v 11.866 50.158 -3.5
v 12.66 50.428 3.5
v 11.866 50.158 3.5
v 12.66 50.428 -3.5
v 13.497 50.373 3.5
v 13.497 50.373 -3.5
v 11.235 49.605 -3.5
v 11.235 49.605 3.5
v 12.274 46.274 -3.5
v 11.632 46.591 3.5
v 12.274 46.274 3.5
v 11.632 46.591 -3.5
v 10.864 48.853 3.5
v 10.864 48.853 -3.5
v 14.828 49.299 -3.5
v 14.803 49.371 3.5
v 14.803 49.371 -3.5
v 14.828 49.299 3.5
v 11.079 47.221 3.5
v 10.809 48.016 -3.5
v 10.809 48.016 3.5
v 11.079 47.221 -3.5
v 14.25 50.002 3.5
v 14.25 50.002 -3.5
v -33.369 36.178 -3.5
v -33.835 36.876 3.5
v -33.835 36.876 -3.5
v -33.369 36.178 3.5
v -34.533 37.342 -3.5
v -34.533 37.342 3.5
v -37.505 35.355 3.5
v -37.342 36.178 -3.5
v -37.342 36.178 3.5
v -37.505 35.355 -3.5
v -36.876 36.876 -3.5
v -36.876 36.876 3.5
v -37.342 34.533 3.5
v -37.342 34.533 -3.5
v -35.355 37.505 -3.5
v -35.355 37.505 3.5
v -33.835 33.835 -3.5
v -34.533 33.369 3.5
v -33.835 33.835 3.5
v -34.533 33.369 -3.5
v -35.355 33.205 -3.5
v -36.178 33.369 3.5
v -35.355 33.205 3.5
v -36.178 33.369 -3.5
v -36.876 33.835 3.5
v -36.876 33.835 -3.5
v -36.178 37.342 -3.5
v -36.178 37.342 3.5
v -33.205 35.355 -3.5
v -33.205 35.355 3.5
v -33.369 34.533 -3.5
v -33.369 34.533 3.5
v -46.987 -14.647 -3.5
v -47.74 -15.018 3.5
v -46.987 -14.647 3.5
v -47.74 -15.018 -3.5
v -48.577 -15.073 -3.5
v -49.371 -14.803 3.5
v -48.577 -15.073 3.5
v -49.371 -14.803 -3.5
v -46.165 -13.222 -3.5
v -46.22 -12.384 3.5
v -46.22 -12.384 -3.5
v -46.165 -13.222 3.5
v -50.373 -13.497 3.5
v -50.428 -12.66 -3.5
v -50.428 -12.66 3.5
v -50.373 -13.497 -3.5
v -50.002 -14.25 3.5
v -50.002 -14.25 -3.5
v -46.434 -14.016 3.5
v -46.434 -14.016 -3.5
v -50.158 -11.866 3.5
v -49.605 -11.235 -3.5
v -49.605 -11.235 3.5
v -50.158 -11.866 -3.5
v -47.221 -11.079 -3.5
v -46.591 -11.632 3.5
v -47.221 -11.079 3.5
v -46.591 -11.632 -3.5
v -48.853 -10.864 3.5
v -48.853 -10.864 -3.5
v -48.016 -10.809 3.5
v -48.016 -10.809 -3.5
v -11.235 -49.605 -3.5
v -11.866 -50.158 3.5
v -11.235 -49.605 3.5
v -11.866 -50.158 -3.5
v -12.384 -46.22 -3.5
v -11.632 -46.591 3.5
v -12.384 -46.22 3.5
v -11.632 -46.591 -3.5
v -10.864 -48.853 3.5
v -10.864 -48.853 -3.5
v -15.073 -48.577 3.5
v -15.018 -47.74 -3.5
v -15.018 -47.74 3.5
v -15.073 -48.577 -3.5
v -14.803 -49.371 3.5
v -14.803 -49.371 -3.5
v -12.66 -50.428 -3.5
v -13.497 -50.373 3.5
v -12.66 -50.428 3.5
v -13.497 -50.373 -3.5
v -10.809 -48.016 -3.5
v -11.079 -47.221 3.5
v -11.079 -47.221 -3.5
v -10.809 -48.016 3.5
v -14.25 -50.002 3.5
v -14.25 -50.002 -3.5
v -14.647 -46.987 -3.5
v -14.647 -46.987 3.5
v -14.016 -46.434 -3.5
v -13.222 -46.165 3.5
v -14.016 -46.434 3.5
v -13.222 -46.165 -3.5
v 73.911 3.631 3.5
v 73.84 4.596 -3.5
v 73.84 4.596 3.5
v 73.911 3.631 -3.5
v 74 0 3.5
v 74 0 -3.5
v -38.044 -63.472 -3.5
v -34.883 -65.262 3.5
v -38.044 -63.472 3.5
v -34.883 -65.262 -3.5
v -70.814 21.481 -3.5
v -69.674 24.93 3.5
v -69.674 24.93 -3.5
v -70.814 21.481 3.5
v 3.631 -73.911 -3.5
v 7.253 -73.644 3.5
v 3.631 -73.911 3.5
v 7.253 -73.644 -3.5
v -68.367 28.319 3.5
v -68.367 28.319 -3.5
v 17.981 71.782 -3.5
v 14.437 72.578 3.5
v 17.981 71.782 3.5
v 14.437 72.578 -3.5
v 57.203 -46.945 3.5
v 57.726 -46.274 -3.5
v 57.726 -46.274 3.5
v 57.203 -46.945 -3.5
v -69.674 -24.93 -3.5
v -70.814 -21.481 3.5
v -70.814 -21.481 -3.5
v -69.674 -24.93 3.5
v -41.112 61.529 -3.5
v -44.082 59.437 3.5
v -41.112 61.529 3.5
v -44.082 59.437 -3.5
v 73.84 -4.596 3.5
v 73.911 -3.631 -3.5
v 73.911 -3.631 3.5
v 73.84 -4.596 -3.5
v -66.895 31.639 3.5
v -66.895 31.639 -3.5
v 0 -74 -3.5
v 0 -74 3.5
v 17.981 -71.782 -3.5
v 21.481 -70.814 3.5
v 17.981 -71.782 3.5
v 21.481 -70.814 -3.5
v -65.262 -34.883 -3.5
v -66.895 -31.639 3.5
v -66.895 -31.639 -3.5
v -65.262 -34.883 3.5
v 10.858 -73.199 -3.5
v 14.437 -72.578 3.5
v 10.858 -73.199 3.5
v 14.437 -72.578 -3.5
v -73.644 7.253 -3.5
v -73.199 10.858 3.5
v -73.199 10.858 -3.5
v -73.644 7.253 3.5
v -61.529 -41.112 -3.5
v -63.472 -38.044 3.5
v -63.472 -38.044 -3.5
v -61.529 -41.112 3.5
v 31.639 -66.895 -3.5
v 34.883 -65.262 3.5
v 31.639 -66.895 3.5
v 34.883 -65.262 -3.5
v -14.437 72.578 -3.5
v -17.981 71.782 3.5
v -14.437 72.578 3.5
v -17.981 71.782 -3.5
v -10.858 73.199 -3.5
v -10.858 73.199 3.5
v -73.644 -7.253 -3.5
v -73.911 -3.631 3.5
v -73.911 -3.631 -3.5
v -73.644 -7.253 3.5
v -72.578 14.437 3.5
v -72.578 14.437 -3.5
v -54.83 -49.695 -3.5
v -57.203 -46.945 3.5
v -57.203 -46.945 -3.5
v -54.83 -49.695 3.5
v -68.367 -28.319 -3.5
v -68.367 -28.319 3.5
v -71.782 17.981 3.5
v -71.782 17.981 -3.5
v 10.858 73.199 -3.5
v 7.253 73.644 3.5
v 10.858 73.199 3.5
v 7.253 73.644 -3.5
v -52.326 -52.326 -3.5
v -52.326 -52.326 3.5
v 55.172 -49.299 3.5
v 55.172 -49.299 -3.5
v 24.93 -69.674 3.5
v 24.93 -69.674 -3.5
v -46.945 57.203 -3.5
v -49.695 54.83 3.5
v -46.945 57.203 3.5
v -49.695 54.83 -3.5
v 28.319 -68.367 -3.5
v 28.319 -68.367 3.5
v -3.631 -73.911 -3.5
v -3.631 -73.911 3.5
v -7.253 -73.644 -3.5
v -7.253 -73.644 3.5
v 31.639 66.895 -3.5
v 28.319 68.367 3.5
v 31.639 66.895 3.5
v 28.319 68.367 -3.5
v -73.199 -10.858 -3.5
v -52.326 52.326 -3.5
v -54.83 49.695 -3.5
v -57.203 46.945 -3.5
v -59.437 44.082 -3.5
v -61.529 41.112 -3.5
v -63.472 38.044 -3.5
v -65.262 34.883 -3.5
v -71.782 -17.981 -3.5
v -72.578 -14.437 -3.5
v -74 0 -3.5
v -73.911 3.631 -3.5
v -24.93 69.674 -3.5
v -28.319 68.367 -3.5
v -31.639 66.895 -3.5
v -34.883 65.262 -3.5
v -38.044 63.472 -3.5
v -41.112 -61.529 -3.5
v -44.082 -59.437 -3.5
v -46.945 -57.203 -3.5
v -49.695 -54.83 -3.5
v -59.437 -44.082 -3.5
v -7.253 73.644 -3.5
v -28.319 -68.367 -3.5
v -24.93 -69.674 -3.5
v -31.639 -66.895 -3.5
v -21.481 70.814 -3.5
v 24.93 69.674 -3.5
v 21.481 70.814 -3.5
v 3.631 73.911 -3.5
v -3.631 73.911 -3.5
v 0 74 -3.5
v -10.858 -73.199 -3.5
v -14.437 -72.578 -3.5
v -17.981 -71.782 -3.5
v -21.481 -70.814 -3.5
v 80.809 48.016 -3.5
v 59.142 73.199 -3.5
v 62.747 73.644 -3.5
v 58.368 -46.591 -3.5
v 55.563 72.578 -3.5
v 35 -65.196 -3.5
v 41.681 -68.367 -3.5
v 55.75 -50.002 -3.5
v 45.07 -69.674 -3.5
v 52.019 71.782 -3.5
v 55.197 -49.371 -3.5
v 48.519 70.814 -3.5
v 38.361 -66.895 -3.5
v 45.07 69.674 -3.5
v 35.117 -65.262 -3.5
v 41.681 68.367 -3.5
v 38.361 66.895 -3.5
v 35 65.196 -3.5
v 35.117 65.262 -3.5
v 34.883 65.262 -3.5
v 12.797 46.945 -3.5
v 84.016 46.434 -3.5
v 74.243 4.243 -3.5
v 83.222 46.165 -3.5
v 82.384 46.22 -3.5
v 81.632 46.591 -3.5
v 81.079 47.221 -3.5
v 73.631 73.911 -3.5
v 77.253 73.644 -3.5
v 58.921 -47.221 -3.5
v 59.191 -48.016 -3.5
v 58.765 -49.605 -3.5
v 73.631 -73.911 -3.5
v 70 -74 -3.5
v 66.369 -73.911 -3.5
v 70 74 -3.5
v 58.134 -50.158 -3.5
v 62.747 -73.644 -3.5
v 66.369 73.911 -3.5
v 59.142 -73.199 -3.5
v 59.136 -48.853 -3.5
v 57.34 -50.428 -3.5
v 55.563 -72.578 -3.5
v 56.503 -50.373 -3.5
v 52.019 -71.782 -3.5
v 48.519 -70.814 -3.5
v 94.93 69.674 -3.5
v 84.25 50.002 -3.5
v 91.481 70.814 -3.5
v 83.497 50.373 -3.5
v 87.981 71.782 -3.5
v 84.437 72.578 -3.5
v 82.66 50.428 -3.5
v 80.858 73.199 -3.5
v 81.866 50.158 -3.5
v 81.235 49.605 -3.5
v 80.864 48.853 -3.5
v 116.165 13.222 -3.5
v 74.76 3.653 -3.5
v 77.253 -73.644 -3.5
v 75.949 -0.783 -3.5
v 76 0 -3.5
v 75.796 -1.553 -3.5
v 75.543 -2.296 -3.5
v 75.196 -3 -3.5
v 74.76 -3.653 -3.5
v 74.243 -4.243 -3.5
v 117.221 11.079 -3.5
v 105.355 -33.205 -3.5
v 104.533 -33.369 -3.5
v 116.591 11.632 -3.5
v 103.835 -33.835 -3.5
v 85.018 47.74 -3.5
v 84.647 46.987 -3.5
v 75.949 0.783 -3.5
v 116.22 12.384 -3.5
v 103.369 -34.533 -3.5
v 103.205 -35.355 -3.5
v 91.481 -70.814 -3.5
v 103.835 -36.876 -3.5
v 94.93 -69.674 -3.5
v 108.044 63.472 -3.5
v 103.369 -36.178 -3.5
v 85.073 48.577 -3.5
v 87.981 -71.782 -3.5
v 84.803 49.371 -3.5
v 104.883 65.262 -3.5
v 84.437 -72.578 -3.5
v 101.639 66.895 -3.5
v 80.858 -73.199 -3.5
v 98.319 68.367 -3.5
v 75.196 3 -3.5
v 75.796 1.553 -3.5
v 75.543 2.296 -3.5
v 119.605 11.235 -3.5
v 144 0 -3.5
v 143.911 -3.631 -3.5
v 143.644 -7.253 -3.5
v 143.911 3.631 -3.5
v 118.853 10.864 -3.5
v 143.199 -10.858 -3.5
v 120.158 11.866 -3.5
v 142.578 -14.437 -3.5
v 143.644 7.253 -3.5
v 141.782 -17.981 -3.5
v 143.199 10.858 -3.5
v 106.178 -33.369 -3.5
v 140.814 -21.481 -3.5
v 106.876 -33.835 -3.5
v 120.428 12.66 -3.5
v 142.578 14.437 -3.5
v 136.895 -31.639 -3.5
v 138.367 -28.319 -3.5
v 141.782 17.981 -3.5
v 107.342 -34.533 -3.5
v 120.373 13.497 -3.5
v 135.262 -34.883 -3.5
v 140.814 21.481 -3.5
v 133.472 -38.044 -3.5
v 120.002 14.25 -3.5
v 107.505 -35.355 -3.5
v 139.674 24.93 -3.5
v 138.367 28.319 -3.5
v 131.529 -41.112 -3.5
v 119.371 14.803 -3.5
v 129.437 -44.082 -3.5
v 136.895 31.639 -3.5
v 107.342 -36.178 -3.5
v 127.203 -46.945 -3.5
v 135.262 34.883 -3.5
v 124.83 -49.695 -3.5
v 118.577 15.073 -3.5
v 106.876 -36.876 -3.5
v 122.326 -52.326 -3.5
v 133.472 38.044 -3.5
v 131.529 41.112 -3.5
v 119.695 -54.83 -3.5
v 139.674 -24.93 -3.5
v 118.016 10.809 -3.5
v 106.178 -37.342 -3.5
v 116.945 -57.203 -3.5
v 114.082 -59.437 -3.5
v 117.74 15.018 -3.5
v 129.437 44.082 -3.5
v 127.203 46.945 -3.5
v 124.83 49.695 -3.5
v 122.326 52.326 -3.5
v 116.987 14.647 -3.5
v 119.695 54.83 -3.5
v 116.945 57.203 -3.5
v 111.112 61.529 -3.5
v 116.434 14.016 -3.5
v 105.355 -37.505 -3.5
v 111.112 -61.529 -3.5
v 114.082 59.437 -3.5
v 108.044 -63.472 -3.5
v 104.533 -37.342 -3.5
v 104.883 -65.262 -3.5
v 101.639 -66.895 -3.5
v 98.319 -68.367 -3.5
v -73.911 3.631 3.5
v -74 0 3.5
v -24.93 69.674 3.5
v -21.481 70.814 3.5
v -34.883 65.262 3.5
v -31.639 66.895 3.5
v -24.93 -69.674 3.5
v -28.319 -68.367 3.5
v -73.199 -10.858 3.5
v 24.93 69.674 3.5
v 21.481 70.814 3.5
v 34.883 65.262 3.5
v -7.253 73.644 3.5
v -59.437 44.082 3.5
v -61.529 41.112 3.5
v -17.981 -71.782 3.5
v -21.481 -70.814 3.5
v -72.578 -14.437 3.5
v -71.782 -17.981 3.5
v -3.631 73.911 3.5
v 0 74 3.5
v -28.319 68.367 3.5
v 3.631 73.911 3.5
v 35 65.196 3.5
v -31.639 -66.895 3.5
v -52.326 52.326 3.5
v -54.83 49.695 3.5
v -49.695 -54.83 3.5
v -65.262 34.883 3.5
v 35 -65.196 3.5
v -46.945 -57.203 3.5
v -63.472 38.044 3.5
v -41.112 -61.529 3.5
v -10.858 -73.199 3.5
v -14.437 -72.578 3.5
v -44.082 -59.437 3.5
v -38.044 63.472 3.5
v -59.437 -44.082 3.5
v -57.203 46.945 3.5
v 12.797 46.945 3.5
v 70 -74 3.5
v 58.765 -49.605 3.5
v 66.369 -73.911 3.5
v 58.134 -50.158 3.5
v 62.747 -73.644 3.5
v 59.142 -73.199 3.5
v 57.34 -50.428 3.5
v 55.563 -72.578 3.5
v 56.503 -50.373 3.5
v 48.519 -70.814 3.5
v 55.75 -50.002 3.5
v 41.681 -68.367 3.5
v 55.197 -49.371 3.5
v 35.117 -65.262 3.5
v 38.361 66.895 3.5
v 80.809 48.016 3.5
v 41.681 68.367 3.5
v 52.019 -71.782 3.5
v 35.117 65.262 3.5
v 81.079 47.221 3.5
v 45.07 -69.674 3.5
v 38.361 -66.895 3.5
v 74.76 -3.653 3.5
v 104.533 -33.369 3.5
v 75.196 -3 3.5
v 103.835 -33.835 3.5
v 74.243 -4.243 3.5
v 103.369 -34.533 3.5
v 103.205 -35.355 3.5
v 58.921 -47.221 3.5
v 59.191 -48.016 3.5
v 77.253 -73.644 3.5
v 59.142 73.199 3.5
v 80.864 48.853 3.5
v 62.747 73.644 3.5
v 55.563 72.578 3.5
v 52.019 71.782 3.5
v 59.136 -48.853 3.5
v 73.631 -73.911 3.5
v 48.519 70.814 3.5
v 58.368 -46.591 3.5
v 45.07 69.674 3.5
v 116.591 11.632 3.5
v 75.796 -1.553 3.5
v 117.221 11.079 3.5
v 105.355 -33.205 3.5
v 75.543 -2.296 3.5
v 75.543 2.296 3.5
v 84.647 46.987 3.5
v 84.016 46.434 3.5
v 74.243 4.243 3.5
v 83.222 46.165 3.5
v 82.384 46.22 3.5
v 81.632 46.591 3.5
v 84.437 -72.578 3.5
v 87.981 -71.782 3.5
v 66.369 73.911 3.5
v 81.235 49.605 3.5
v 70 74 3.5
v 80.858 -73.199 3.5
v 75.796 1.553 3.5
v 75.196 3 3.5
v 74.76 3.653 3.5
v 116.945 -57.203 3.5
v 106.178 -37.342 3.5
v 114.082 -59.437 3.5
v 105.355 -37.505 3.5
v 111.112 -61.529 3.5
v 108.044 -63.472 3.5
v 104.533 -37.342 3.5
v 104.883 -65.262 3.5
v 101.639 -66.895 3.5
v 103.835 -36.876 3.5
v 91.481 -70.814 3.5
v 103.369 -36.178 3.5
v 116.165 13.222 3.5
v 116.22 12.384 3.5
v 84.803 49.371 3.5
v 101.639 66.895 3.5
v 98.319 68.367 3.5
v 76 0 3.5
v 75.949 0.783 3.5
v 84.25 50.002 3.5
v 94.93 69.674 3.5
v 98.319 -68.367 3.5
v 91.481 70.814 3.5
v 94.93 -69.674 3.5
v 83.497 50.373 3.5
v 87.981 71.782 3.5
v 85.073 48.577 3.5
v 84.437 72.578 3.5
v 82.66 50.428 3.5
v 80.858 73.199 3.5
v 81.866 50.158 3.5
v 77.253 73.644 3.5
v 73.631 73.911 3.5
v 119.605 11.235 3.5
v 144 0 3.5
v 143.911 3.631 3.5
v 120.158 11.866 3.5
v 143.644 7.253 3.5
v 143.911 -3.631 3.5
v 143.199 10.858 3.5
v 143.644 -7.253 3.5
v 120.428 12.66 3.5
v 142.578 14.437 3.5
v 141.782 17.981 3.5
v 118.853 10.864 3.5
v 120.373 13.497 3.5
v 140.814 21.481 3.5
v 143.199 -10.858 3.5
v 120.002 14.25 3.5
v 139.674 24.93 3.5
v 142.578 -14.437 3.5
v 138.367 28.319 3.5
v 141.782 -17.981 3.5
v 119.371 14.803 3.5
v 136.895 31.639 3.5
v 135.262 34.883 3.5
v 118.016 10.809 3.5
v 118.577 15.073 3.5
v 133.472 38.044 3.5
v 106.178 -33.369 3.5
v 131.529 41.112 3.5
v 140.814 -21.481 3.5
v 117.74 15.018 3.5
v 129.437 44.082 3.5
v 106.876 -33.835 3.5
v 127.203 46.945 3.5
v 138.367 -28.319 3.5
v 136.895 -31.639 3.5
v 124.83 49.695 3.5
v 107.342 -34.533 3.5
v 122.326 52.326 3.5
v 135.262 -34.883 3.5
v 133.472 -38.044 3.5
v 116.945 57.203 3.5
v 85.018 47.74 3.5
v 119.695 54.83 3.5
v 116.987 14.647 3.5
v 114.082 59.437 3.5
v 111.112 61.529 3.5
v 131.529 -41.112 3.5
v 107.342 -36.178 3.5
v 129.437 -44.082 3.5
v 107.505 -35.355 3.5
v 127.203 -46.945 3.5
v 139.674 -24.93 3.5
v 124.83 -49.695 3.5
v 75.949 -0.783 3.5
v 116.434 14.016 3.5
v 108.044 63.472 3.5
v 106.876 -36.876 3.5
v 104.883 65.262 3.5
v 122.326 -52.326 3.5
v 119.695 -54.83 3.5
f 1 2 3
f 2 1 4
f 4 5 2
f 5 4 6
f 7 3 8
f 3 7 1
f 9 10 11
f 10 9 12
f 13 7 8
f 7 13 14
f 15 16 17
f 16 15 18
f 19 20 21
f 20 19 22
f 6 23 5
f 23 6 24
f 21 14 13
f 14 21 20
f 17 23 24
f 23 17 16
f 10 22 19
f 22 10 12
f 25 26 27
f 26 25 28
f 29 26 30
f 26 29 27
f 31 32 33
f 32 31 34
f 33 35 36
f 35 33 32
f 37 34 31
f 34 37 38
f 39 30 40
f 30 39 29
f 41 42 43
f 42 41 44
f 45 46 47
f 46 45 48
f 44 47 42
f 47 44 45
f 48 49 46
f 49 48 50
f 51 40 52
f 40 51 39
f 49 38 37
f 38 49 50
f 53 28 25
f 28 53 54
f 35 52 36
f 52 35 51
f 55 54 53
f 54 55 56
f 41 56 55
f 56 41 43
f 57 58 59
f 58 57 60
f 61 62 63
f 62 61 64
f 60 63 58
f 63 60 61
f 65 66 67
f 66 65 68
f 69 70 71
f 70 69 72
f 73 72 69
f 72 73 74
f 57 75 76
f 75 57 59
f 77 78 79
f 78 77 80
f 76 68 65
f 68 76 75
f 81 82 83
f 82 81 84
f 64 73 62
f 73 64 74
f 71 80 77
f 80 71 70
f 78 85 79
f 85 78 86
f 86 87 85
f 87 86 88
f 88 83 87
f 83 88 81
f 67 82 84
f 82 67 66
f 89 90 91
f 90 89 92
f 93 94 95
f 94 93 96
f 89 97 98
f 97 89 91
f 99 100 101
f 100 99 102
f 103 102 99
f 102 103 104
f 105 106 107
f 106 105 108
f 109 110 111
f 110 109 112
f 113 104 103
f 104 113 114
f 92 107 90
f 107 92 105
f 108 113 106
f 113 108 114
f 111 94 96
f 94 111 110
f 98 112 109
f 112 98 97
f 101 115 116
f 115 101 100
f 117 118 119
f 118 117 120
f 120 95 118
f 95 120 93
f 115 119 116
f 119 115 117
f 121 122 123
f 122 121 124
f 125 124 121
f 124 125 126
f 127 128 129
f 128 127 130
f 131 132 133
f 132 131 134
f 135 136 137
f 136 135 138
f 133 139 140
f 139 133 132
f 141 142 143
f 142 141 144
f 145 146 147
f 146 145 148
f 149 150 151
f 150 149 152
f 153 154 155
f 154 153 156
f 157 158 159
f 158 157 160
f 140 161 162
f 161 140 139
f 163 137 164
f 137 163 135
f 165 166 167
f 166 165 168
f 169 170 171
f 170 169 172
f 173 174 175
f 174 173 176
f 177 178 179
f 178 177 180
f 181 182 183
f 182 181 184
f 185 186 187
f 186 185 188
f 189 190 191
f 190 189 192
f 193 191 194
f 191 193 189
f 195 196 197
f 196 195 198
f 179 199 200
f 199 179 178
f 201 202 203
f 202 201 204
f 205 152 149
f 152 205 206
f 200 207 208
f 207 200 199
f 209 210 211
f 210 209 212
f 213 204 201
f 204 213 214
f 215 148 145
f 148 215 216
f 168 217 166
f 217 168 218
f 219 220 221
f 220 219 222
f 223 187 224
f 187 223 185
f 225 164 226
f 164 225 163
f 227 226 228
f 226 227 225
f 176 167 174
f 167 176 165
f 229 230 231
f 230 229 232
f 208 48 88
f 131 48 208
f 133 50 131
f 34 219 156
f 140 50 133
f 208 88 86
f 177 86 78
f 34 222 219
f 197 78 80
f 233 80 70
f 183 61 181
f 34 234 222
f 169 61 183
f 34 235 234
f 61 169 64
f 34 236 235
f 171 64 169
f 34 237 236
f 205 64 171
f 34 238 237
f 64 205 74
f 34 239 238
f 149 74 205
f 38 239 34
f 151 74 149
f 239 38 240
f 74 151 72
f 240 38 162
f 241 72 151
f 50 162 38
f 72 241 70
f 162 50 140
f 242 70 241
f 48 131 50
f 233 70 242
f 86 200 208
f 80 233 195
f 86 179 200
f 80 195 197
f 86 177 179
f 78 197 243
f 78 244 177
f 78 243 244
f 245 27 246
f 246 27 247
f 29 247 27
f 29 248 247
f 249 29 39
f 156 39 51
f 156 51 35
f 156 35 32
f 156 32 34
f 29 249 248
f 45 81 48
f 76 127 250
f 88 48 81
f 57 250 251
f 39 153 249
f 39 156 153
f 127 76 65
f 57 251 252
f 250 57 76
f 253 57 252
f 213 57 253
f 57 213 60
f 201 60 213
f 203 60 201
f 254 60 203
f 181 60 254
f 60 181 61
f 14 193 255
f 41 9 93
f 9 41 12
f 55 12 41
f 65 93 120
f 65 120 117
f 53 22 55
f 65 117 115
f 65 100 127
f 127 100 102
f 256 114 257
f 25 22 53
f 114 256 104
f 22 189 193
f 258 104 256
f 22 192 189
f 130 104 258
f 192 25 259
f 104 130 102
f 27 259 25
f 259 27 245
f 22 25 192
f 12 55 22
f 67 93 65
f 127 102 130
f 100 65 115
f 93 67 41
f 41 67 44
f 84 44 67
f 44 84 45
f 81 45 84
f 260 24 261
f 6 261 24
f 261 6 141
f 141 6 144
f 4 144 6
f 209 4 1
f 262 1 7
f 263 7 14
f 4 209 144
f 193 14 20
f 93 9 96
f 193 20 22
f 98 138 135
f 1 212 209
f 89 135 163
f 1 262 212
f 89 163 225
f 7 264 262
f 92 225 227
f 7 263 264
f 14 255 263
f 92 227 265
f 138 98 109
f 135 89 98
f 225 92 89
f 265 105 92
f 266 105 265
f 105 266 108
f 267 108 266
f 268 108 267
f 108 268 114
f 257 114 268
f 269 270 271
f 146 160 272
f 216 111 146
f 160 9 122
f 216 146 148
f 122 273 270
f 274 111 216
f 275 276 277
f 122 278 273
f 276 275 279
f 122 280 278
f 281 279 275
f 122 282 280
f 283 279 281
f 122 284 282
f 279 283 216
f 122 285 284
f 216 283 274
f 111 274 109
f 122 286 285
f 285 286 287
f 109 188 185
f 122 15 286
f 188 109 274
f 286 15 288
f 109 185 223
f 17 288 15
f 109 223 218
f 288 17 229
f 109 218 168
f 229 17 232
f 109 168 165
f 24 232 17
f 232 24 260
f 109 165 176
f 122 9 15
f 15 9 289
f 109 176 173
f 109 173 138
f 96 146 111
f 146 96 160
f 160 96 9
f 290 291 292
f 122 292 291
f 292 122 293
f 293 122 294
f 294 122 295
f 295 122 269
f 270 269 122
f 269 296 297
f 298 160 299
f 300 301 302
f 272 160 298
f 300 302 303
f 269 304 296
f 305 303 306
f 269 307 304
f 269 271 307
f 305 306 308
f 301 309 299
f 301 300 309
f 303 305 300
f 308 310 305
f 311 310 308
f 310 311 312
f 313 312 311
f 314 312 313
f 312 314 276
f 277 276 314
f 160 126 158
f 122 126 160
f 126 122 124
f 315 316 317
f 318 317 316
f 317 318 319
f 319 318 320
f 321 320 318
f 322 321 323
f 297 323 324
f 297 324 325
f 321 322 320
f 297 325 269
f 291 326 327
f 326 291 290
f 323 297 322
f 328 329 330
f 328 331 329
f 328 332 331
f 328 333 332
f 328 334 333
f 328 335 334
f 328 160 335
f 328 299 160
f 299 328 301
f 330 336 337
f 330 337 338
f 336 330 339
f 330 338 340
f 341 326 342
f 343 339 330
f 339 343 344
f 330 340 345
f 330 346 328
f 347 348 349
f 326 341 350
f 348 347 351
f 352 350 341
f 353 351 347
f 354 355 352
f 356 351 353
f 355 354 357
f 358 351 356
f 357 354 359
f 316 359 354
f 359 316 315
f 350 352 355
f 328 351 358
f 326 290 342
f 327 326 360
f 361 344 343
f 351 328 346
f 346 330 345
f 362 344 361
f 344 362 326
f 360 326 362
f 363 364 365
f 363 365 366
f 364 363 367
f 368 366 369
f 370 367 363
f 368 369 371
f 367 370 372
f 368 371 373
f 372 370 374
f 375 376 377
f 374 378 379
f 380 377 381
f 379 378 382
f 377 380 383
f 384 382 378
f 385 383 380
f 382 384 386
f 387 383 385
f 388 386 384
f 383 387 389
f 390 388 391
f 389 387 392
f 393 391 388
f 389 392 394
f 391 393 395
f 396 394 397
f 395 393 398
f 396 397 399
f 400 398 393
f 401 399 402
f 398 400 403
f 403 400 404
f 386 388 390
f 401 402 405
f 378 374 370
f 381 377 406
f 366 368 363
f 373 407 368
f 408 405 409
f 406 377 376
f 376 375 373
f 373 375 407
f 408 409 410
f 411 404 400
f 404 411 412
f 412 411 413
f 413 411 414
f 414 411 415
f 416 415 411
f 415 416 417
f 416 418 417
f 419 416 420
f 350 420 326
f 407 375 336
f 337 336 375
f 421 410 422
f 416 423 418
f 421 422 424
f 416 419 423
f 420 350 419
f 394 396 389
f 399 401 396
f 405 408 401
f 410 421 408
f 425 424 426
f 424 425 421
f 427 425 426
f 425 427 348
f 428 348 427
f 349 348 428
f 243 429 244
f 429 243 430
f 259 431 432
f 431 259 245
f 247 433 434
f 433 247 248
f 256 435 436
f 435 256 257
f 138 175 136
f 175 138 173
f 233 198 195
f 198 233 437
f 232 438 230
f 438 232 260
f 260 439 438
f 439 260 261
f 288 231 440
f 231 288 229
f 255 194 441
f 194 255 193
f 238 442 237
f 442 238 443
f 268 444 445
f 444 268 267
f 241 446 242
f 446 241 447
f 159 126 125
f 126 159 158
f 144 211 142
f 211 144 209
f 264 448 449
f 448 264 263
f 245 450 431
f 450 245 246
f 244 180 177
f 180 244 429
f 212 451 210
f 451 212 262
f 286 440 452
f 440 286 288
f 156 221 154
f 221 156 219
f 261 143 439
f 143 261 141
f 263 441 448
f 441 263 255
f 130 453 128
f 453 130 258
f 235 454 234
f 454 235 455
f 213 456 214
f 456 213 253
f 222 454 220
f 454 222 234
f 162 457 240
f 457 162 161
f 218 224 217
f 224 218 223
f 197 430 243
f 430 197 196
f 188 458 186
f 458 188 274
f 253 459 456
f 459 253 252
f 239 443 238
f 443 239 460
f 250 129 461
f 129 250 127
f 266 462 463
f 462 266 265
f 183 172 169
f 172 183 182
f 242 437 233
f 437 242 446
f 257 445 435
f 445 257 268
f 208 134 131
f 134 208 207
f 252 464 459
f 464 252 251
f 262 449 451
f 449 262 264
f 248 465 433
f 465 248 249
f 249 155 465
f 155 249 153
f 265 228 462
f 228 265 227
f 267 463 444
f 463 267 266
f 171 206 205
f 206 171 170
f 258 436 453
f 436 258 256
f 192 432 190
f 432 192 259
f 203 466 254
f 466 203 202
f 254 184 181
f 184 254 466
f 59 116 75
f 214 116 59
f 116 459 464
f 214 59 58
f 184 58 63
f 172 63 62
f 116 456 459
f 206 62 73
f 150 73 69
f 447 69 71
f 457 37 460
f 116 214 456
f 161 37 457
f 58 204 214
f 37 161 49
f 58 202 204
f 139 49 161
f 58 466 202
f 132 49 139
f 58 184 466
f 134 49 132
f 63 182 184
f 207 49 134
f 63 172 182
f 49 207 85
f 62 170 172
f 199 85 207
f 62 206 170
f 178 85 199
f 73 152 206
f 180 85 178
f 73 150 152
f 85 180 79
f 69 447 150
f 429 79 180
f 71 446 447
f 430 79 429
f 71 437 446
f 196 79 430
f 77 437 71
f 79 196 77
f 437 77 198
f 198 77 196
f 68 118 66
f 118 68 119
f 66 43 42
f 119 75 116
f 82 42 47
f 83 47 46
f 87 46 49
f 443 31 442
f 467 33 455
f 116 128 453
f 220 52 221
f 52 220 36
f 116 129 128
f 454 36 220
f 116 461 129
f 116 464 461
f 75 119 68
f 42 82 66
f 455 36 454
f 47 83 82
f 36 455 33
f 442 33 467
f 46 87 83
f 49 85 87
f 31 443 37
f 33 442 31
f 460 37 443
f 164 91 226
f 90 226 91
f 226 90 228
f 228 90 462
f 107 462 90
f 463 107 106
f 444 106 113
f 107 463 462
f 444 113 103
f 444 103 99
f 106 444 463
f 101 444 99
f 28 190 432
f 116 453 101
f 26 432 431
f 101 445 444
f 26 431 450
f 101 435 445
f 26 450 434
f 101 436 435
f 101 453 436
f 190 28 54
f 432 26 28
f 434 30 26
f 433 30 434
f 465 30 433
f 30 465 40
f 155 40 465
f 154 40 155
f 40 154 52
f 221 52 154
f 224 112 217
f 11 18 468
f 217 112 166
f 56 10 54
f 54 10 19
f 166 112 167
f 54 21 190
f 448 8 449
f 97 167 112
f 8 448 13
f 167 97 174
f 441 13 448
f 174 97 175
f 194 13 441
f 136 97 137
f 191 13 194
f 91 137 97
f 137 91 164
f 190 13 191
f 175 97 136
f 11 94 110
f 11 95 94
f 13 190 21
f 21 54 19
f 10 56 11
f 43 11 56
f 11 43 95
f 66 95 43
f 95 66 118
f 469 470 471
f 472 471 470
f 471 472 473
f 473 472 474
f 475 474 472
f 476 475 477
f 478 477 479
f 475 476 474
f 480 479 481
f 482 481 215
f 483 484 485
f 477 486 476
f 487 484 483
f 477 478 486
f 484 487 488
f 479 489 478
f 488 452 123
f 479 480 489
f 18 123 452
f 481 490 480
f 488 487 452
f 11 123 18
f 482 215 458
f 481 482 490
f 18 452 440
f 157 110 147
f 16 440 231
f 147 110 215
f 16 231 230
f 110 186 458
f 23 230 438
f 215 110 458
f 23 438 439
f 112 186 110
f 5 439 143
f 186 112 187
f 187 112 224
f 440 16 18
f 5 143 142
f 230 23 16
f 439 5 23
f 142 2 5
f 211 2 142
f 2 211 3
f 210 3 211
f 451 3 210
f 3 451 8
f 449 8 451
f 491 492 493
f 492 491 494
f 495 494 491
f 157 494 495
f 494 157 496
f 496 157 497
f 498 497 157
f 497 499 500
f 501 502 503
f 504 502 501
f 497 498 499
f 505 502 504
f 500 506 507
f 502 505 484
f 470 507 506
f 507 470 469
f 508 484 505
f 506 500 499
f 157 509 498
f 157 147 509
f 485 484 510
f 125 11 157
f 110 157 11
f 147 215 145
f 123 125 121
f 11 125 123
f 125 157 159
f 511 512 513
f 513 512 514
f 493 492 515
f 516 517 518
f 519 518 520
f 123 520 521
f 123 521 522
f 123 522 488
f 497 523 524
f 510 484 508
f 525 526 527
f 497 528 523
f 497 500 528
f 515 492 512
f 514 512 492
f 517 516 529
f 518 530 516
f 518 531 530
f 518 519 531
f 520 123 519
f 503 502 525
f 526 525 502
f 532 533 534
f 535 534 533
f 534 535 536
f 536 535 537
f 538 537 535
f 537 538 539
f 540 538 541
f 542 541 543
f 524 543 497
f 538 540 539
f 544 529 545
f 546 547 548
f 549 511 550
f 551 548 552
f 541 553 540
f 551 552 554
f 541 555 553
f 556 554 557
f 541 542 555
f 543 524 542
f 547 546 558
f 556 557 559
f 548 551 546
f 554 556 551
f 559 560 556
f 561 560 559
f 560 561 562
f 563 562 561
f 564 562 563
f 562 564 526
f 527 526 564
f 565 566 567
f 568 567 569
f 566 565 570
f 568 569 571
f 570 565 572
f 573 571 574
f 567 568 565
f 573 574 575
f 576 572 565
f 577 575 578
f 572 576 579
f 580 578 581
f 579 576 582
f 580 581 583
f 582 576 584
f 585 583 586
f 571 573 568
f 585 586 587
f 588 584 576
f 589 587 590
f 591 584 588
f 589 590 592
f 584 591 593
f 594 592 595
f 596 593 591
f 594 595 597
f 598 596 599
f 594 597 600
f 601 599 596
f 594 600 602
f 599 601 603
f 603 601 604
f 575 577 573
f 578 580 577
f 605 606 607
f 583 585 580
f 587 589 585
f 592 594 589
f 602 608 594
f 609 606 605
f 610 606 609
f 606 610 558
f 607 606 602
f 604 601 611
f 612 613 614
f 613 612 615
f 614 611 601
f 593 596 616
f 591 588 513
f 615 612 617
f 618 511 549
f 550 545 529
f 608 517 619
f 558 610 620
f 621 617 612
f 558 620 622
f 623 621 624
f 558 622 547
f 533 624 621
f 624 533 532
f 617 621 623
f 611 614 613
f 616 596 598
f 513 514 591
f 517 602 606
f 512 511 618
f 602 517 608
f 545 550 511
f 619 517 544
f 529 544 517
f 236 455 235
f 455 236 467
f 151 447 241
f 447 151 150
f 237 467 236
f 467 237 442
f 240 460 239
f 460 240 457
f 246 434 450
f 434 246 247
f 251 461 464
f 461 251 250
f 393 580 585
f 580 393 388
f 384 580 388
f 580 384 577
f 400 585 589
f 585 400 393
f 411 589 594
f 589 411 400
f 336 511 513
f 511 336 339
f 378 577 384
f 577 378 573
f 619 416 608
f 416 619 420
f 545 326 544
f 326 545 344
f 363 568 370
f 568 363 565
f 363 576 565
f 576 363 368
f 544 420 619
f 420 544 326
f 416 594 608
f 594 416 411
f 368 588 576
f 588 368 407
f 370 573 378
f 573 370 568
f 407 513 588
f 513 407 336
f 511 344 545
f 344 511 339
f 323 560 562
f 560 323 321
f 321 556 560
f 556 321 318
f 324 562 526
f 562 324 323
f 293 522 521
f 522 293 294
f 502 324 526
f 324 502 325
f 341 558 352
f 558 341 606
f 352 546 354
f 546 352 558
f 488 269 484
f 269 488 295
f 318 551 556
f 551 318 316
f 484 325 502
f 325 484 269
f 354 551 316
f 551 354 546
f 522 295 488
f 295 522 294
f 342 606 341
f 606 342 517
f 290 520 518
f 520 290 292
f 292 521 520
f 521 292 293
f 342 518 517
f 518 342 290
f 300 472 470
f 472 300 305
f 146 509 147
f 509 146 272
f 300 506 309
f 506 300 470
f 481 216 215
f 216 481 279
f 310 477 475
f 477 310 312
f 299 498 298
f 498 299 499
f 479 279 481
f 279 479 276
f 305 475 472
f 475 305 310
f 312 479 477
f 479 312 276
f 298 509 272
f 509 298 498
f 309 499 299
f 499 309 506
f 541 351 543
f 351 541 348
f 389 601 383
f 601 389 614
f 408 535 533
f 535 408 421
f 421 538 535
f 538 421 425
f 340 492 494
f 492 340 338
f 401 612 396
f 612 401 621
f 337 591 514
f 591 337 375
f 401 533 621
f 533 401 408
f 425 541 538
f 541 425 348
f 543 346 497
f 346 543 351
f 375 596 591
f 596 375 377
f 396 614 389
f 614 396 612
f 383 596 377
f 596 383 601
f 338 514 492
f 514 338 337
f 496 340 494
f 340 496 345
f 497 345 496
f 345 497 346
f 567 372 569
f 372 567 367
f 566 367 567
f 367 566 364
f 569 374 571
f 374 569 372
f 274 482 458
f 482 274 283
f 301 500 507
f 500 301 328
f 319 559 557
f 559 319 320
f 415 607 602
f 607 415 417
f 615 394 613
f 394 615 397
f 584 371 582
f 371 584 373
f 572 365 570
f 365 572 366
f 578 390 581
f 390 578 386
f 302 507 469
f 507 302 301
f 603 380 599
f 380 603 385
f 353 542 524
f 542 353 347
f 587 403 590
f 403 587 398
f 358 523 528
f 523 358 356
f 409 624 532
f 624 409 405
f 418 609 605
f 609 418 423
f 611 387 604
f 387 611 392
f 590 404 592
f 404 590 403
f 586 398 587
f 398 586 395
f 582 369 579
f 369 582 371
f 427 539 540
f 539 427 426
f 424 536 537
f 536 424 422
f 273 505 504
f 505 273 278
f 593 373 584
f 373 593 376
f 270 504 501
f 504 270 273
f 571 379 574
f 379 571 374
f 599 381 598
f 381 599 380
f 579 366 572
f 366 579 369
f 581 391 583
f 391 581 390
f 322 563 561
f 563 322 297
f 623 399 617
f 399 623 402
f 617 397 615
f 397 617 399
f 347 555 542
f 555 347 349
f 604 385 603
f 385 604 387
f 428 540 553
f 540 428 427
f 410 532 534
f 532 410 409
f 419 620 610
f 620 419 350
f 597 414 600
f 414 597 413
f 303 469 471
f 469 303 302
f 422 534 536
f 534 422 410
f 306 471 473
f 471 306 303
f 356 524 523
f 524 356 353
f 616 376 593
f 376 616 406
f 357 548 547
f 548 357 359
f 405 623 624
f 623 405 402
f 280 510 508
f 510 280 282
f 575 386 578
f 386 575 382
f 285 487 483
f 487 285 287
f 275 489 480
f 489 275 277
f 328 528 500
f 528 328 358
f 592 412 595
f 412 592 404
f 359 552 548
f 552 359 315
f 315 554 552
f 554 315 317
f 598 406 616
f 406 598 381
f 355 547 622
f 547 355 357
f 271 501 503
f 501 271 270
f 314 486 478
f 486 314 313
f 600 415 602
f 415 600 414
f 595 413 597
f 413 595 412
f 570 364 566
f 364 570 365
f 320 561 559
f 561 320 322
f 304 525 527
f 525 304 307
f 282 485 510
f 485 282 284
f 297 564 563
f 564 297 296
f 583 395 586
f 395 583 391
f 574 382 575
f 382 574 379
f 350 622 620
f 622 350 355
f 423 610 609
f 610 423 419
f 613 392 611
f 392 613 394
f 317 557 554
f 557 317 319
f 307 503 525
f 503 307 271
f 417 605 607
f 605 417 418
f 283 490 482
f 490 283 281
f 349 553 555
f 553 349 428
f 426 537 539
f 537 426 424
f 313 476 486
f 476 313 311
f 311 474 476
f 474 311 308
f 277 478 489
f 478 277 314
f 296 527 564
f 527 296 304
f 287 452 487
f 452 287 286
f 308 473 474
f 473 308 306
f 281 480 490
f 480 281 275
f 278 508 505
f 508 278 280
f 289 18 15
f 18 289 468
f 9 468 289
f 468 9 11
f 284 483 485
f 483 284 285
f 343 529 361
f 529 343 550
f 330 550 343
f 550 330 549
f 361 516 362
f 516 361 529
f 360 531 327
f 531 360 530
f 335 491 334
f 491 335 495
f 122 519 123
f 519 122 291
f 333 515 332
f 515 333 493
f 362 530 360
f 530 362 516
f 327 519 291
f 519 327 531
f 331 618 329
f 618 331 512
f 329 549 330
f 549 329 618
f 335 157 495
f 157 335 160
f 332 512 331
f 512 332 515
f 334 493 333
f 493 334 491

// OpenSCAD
/*
 * CD/DVD Version - Operation Covers (Top and Bottom)
 * Solid versions for when viewport is not needed, plus bottom jet cover.
 */

module cd_dvd_operation_cover(has_orifice=false, orifice_d=12) {
    difference() {
        cylinder(d=120 + 28, h=7, center=true, $fn=128);
        
        if (has_orifice) {
            cylinder(d=orifice_d, h=9, center=true, $fn=48);
        }
        
        // Bolt pattern
        for (i = [0:5]) {
            rotate([0,0,i*60 + 15])
                translate([120/2 - 10, 0, 0])
                    cylinder(d=4.3, h=9, center=true, $fn=16);
        }
    }
}

// Solid top cover
cd_dvd_operation_cover(has_orifice=false);

// Bottom jet cover with orifice
translate([70, 0, 0])
    cd_dvd_operation_cover(has_orifice=true, orifice_d=12);
